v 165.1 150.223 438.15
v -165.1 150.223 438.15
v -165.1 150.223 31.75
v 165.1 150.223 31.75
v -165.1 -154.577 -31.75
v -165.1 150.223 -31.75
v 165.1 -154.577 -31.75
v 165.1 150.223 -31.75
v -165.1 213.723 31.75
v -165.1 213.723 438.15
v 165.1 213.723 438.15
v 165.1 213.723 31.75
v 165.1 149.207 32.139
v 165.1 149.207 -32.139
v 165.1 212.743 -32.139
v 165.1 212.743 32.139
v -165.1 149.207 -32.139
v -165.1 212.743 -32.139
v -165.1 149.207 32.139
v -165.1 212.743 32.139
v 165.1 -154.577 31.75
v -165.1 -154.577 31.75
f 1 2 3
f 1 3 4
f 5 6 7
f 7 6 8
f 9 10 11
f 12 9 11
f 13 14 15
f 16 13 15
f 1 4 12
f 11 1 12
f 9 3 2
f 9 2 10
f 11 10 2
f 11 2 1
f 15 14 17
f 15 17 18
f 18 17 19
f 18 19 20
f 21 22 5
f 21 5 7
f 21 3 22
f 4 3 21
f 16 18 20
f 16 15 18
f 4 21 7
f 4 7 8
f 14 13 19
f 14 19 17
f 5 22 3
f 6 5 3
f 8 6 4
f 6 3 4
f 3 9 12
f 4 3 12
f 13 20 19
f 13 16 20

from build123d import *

# Parameters (mm, degrees)
F0_W     = 330.2
F0_H     = 304.8
F1_DEPTH = 31.75
F2_W     = 330.2
F2_H     = 63.5
F3_DEPTH = 406.4
F5_DEPTH = 165.1


with BuildPart() as f1:
    # F0 (on Top) → F1 (new body, symmetric)
    with BuildSketch(Plane.XY):
        with Locations((0, -2.177143)):
            Rectangle(F0_W, F0_H)
    extrude(amount=F1_DEPTH, both=True)

    # F2 (on face) → F3 (join)
    with BuildSketch(Plane.XY.offset(31.75)):
        with Locations((0, 181.972857)):
            Rectangle(F2_W, F2_H)
    extrude(amount=F3_DEPTH)


with BuildPart() as f5:
    # F4 (on Right) → F5 (new body, symmetric)
    with BuildSketch(Plane.YZ):
        Polygon((212.743093, 32.138608), (149.206907, 32.138608), (149.206907, 0), (149.206907, -32.138608), (212.743093, -32.138608), align=None)
    extrude(amount=F5_DEPTH, both=True)


solid = Compound([f1.part, f5.part])
